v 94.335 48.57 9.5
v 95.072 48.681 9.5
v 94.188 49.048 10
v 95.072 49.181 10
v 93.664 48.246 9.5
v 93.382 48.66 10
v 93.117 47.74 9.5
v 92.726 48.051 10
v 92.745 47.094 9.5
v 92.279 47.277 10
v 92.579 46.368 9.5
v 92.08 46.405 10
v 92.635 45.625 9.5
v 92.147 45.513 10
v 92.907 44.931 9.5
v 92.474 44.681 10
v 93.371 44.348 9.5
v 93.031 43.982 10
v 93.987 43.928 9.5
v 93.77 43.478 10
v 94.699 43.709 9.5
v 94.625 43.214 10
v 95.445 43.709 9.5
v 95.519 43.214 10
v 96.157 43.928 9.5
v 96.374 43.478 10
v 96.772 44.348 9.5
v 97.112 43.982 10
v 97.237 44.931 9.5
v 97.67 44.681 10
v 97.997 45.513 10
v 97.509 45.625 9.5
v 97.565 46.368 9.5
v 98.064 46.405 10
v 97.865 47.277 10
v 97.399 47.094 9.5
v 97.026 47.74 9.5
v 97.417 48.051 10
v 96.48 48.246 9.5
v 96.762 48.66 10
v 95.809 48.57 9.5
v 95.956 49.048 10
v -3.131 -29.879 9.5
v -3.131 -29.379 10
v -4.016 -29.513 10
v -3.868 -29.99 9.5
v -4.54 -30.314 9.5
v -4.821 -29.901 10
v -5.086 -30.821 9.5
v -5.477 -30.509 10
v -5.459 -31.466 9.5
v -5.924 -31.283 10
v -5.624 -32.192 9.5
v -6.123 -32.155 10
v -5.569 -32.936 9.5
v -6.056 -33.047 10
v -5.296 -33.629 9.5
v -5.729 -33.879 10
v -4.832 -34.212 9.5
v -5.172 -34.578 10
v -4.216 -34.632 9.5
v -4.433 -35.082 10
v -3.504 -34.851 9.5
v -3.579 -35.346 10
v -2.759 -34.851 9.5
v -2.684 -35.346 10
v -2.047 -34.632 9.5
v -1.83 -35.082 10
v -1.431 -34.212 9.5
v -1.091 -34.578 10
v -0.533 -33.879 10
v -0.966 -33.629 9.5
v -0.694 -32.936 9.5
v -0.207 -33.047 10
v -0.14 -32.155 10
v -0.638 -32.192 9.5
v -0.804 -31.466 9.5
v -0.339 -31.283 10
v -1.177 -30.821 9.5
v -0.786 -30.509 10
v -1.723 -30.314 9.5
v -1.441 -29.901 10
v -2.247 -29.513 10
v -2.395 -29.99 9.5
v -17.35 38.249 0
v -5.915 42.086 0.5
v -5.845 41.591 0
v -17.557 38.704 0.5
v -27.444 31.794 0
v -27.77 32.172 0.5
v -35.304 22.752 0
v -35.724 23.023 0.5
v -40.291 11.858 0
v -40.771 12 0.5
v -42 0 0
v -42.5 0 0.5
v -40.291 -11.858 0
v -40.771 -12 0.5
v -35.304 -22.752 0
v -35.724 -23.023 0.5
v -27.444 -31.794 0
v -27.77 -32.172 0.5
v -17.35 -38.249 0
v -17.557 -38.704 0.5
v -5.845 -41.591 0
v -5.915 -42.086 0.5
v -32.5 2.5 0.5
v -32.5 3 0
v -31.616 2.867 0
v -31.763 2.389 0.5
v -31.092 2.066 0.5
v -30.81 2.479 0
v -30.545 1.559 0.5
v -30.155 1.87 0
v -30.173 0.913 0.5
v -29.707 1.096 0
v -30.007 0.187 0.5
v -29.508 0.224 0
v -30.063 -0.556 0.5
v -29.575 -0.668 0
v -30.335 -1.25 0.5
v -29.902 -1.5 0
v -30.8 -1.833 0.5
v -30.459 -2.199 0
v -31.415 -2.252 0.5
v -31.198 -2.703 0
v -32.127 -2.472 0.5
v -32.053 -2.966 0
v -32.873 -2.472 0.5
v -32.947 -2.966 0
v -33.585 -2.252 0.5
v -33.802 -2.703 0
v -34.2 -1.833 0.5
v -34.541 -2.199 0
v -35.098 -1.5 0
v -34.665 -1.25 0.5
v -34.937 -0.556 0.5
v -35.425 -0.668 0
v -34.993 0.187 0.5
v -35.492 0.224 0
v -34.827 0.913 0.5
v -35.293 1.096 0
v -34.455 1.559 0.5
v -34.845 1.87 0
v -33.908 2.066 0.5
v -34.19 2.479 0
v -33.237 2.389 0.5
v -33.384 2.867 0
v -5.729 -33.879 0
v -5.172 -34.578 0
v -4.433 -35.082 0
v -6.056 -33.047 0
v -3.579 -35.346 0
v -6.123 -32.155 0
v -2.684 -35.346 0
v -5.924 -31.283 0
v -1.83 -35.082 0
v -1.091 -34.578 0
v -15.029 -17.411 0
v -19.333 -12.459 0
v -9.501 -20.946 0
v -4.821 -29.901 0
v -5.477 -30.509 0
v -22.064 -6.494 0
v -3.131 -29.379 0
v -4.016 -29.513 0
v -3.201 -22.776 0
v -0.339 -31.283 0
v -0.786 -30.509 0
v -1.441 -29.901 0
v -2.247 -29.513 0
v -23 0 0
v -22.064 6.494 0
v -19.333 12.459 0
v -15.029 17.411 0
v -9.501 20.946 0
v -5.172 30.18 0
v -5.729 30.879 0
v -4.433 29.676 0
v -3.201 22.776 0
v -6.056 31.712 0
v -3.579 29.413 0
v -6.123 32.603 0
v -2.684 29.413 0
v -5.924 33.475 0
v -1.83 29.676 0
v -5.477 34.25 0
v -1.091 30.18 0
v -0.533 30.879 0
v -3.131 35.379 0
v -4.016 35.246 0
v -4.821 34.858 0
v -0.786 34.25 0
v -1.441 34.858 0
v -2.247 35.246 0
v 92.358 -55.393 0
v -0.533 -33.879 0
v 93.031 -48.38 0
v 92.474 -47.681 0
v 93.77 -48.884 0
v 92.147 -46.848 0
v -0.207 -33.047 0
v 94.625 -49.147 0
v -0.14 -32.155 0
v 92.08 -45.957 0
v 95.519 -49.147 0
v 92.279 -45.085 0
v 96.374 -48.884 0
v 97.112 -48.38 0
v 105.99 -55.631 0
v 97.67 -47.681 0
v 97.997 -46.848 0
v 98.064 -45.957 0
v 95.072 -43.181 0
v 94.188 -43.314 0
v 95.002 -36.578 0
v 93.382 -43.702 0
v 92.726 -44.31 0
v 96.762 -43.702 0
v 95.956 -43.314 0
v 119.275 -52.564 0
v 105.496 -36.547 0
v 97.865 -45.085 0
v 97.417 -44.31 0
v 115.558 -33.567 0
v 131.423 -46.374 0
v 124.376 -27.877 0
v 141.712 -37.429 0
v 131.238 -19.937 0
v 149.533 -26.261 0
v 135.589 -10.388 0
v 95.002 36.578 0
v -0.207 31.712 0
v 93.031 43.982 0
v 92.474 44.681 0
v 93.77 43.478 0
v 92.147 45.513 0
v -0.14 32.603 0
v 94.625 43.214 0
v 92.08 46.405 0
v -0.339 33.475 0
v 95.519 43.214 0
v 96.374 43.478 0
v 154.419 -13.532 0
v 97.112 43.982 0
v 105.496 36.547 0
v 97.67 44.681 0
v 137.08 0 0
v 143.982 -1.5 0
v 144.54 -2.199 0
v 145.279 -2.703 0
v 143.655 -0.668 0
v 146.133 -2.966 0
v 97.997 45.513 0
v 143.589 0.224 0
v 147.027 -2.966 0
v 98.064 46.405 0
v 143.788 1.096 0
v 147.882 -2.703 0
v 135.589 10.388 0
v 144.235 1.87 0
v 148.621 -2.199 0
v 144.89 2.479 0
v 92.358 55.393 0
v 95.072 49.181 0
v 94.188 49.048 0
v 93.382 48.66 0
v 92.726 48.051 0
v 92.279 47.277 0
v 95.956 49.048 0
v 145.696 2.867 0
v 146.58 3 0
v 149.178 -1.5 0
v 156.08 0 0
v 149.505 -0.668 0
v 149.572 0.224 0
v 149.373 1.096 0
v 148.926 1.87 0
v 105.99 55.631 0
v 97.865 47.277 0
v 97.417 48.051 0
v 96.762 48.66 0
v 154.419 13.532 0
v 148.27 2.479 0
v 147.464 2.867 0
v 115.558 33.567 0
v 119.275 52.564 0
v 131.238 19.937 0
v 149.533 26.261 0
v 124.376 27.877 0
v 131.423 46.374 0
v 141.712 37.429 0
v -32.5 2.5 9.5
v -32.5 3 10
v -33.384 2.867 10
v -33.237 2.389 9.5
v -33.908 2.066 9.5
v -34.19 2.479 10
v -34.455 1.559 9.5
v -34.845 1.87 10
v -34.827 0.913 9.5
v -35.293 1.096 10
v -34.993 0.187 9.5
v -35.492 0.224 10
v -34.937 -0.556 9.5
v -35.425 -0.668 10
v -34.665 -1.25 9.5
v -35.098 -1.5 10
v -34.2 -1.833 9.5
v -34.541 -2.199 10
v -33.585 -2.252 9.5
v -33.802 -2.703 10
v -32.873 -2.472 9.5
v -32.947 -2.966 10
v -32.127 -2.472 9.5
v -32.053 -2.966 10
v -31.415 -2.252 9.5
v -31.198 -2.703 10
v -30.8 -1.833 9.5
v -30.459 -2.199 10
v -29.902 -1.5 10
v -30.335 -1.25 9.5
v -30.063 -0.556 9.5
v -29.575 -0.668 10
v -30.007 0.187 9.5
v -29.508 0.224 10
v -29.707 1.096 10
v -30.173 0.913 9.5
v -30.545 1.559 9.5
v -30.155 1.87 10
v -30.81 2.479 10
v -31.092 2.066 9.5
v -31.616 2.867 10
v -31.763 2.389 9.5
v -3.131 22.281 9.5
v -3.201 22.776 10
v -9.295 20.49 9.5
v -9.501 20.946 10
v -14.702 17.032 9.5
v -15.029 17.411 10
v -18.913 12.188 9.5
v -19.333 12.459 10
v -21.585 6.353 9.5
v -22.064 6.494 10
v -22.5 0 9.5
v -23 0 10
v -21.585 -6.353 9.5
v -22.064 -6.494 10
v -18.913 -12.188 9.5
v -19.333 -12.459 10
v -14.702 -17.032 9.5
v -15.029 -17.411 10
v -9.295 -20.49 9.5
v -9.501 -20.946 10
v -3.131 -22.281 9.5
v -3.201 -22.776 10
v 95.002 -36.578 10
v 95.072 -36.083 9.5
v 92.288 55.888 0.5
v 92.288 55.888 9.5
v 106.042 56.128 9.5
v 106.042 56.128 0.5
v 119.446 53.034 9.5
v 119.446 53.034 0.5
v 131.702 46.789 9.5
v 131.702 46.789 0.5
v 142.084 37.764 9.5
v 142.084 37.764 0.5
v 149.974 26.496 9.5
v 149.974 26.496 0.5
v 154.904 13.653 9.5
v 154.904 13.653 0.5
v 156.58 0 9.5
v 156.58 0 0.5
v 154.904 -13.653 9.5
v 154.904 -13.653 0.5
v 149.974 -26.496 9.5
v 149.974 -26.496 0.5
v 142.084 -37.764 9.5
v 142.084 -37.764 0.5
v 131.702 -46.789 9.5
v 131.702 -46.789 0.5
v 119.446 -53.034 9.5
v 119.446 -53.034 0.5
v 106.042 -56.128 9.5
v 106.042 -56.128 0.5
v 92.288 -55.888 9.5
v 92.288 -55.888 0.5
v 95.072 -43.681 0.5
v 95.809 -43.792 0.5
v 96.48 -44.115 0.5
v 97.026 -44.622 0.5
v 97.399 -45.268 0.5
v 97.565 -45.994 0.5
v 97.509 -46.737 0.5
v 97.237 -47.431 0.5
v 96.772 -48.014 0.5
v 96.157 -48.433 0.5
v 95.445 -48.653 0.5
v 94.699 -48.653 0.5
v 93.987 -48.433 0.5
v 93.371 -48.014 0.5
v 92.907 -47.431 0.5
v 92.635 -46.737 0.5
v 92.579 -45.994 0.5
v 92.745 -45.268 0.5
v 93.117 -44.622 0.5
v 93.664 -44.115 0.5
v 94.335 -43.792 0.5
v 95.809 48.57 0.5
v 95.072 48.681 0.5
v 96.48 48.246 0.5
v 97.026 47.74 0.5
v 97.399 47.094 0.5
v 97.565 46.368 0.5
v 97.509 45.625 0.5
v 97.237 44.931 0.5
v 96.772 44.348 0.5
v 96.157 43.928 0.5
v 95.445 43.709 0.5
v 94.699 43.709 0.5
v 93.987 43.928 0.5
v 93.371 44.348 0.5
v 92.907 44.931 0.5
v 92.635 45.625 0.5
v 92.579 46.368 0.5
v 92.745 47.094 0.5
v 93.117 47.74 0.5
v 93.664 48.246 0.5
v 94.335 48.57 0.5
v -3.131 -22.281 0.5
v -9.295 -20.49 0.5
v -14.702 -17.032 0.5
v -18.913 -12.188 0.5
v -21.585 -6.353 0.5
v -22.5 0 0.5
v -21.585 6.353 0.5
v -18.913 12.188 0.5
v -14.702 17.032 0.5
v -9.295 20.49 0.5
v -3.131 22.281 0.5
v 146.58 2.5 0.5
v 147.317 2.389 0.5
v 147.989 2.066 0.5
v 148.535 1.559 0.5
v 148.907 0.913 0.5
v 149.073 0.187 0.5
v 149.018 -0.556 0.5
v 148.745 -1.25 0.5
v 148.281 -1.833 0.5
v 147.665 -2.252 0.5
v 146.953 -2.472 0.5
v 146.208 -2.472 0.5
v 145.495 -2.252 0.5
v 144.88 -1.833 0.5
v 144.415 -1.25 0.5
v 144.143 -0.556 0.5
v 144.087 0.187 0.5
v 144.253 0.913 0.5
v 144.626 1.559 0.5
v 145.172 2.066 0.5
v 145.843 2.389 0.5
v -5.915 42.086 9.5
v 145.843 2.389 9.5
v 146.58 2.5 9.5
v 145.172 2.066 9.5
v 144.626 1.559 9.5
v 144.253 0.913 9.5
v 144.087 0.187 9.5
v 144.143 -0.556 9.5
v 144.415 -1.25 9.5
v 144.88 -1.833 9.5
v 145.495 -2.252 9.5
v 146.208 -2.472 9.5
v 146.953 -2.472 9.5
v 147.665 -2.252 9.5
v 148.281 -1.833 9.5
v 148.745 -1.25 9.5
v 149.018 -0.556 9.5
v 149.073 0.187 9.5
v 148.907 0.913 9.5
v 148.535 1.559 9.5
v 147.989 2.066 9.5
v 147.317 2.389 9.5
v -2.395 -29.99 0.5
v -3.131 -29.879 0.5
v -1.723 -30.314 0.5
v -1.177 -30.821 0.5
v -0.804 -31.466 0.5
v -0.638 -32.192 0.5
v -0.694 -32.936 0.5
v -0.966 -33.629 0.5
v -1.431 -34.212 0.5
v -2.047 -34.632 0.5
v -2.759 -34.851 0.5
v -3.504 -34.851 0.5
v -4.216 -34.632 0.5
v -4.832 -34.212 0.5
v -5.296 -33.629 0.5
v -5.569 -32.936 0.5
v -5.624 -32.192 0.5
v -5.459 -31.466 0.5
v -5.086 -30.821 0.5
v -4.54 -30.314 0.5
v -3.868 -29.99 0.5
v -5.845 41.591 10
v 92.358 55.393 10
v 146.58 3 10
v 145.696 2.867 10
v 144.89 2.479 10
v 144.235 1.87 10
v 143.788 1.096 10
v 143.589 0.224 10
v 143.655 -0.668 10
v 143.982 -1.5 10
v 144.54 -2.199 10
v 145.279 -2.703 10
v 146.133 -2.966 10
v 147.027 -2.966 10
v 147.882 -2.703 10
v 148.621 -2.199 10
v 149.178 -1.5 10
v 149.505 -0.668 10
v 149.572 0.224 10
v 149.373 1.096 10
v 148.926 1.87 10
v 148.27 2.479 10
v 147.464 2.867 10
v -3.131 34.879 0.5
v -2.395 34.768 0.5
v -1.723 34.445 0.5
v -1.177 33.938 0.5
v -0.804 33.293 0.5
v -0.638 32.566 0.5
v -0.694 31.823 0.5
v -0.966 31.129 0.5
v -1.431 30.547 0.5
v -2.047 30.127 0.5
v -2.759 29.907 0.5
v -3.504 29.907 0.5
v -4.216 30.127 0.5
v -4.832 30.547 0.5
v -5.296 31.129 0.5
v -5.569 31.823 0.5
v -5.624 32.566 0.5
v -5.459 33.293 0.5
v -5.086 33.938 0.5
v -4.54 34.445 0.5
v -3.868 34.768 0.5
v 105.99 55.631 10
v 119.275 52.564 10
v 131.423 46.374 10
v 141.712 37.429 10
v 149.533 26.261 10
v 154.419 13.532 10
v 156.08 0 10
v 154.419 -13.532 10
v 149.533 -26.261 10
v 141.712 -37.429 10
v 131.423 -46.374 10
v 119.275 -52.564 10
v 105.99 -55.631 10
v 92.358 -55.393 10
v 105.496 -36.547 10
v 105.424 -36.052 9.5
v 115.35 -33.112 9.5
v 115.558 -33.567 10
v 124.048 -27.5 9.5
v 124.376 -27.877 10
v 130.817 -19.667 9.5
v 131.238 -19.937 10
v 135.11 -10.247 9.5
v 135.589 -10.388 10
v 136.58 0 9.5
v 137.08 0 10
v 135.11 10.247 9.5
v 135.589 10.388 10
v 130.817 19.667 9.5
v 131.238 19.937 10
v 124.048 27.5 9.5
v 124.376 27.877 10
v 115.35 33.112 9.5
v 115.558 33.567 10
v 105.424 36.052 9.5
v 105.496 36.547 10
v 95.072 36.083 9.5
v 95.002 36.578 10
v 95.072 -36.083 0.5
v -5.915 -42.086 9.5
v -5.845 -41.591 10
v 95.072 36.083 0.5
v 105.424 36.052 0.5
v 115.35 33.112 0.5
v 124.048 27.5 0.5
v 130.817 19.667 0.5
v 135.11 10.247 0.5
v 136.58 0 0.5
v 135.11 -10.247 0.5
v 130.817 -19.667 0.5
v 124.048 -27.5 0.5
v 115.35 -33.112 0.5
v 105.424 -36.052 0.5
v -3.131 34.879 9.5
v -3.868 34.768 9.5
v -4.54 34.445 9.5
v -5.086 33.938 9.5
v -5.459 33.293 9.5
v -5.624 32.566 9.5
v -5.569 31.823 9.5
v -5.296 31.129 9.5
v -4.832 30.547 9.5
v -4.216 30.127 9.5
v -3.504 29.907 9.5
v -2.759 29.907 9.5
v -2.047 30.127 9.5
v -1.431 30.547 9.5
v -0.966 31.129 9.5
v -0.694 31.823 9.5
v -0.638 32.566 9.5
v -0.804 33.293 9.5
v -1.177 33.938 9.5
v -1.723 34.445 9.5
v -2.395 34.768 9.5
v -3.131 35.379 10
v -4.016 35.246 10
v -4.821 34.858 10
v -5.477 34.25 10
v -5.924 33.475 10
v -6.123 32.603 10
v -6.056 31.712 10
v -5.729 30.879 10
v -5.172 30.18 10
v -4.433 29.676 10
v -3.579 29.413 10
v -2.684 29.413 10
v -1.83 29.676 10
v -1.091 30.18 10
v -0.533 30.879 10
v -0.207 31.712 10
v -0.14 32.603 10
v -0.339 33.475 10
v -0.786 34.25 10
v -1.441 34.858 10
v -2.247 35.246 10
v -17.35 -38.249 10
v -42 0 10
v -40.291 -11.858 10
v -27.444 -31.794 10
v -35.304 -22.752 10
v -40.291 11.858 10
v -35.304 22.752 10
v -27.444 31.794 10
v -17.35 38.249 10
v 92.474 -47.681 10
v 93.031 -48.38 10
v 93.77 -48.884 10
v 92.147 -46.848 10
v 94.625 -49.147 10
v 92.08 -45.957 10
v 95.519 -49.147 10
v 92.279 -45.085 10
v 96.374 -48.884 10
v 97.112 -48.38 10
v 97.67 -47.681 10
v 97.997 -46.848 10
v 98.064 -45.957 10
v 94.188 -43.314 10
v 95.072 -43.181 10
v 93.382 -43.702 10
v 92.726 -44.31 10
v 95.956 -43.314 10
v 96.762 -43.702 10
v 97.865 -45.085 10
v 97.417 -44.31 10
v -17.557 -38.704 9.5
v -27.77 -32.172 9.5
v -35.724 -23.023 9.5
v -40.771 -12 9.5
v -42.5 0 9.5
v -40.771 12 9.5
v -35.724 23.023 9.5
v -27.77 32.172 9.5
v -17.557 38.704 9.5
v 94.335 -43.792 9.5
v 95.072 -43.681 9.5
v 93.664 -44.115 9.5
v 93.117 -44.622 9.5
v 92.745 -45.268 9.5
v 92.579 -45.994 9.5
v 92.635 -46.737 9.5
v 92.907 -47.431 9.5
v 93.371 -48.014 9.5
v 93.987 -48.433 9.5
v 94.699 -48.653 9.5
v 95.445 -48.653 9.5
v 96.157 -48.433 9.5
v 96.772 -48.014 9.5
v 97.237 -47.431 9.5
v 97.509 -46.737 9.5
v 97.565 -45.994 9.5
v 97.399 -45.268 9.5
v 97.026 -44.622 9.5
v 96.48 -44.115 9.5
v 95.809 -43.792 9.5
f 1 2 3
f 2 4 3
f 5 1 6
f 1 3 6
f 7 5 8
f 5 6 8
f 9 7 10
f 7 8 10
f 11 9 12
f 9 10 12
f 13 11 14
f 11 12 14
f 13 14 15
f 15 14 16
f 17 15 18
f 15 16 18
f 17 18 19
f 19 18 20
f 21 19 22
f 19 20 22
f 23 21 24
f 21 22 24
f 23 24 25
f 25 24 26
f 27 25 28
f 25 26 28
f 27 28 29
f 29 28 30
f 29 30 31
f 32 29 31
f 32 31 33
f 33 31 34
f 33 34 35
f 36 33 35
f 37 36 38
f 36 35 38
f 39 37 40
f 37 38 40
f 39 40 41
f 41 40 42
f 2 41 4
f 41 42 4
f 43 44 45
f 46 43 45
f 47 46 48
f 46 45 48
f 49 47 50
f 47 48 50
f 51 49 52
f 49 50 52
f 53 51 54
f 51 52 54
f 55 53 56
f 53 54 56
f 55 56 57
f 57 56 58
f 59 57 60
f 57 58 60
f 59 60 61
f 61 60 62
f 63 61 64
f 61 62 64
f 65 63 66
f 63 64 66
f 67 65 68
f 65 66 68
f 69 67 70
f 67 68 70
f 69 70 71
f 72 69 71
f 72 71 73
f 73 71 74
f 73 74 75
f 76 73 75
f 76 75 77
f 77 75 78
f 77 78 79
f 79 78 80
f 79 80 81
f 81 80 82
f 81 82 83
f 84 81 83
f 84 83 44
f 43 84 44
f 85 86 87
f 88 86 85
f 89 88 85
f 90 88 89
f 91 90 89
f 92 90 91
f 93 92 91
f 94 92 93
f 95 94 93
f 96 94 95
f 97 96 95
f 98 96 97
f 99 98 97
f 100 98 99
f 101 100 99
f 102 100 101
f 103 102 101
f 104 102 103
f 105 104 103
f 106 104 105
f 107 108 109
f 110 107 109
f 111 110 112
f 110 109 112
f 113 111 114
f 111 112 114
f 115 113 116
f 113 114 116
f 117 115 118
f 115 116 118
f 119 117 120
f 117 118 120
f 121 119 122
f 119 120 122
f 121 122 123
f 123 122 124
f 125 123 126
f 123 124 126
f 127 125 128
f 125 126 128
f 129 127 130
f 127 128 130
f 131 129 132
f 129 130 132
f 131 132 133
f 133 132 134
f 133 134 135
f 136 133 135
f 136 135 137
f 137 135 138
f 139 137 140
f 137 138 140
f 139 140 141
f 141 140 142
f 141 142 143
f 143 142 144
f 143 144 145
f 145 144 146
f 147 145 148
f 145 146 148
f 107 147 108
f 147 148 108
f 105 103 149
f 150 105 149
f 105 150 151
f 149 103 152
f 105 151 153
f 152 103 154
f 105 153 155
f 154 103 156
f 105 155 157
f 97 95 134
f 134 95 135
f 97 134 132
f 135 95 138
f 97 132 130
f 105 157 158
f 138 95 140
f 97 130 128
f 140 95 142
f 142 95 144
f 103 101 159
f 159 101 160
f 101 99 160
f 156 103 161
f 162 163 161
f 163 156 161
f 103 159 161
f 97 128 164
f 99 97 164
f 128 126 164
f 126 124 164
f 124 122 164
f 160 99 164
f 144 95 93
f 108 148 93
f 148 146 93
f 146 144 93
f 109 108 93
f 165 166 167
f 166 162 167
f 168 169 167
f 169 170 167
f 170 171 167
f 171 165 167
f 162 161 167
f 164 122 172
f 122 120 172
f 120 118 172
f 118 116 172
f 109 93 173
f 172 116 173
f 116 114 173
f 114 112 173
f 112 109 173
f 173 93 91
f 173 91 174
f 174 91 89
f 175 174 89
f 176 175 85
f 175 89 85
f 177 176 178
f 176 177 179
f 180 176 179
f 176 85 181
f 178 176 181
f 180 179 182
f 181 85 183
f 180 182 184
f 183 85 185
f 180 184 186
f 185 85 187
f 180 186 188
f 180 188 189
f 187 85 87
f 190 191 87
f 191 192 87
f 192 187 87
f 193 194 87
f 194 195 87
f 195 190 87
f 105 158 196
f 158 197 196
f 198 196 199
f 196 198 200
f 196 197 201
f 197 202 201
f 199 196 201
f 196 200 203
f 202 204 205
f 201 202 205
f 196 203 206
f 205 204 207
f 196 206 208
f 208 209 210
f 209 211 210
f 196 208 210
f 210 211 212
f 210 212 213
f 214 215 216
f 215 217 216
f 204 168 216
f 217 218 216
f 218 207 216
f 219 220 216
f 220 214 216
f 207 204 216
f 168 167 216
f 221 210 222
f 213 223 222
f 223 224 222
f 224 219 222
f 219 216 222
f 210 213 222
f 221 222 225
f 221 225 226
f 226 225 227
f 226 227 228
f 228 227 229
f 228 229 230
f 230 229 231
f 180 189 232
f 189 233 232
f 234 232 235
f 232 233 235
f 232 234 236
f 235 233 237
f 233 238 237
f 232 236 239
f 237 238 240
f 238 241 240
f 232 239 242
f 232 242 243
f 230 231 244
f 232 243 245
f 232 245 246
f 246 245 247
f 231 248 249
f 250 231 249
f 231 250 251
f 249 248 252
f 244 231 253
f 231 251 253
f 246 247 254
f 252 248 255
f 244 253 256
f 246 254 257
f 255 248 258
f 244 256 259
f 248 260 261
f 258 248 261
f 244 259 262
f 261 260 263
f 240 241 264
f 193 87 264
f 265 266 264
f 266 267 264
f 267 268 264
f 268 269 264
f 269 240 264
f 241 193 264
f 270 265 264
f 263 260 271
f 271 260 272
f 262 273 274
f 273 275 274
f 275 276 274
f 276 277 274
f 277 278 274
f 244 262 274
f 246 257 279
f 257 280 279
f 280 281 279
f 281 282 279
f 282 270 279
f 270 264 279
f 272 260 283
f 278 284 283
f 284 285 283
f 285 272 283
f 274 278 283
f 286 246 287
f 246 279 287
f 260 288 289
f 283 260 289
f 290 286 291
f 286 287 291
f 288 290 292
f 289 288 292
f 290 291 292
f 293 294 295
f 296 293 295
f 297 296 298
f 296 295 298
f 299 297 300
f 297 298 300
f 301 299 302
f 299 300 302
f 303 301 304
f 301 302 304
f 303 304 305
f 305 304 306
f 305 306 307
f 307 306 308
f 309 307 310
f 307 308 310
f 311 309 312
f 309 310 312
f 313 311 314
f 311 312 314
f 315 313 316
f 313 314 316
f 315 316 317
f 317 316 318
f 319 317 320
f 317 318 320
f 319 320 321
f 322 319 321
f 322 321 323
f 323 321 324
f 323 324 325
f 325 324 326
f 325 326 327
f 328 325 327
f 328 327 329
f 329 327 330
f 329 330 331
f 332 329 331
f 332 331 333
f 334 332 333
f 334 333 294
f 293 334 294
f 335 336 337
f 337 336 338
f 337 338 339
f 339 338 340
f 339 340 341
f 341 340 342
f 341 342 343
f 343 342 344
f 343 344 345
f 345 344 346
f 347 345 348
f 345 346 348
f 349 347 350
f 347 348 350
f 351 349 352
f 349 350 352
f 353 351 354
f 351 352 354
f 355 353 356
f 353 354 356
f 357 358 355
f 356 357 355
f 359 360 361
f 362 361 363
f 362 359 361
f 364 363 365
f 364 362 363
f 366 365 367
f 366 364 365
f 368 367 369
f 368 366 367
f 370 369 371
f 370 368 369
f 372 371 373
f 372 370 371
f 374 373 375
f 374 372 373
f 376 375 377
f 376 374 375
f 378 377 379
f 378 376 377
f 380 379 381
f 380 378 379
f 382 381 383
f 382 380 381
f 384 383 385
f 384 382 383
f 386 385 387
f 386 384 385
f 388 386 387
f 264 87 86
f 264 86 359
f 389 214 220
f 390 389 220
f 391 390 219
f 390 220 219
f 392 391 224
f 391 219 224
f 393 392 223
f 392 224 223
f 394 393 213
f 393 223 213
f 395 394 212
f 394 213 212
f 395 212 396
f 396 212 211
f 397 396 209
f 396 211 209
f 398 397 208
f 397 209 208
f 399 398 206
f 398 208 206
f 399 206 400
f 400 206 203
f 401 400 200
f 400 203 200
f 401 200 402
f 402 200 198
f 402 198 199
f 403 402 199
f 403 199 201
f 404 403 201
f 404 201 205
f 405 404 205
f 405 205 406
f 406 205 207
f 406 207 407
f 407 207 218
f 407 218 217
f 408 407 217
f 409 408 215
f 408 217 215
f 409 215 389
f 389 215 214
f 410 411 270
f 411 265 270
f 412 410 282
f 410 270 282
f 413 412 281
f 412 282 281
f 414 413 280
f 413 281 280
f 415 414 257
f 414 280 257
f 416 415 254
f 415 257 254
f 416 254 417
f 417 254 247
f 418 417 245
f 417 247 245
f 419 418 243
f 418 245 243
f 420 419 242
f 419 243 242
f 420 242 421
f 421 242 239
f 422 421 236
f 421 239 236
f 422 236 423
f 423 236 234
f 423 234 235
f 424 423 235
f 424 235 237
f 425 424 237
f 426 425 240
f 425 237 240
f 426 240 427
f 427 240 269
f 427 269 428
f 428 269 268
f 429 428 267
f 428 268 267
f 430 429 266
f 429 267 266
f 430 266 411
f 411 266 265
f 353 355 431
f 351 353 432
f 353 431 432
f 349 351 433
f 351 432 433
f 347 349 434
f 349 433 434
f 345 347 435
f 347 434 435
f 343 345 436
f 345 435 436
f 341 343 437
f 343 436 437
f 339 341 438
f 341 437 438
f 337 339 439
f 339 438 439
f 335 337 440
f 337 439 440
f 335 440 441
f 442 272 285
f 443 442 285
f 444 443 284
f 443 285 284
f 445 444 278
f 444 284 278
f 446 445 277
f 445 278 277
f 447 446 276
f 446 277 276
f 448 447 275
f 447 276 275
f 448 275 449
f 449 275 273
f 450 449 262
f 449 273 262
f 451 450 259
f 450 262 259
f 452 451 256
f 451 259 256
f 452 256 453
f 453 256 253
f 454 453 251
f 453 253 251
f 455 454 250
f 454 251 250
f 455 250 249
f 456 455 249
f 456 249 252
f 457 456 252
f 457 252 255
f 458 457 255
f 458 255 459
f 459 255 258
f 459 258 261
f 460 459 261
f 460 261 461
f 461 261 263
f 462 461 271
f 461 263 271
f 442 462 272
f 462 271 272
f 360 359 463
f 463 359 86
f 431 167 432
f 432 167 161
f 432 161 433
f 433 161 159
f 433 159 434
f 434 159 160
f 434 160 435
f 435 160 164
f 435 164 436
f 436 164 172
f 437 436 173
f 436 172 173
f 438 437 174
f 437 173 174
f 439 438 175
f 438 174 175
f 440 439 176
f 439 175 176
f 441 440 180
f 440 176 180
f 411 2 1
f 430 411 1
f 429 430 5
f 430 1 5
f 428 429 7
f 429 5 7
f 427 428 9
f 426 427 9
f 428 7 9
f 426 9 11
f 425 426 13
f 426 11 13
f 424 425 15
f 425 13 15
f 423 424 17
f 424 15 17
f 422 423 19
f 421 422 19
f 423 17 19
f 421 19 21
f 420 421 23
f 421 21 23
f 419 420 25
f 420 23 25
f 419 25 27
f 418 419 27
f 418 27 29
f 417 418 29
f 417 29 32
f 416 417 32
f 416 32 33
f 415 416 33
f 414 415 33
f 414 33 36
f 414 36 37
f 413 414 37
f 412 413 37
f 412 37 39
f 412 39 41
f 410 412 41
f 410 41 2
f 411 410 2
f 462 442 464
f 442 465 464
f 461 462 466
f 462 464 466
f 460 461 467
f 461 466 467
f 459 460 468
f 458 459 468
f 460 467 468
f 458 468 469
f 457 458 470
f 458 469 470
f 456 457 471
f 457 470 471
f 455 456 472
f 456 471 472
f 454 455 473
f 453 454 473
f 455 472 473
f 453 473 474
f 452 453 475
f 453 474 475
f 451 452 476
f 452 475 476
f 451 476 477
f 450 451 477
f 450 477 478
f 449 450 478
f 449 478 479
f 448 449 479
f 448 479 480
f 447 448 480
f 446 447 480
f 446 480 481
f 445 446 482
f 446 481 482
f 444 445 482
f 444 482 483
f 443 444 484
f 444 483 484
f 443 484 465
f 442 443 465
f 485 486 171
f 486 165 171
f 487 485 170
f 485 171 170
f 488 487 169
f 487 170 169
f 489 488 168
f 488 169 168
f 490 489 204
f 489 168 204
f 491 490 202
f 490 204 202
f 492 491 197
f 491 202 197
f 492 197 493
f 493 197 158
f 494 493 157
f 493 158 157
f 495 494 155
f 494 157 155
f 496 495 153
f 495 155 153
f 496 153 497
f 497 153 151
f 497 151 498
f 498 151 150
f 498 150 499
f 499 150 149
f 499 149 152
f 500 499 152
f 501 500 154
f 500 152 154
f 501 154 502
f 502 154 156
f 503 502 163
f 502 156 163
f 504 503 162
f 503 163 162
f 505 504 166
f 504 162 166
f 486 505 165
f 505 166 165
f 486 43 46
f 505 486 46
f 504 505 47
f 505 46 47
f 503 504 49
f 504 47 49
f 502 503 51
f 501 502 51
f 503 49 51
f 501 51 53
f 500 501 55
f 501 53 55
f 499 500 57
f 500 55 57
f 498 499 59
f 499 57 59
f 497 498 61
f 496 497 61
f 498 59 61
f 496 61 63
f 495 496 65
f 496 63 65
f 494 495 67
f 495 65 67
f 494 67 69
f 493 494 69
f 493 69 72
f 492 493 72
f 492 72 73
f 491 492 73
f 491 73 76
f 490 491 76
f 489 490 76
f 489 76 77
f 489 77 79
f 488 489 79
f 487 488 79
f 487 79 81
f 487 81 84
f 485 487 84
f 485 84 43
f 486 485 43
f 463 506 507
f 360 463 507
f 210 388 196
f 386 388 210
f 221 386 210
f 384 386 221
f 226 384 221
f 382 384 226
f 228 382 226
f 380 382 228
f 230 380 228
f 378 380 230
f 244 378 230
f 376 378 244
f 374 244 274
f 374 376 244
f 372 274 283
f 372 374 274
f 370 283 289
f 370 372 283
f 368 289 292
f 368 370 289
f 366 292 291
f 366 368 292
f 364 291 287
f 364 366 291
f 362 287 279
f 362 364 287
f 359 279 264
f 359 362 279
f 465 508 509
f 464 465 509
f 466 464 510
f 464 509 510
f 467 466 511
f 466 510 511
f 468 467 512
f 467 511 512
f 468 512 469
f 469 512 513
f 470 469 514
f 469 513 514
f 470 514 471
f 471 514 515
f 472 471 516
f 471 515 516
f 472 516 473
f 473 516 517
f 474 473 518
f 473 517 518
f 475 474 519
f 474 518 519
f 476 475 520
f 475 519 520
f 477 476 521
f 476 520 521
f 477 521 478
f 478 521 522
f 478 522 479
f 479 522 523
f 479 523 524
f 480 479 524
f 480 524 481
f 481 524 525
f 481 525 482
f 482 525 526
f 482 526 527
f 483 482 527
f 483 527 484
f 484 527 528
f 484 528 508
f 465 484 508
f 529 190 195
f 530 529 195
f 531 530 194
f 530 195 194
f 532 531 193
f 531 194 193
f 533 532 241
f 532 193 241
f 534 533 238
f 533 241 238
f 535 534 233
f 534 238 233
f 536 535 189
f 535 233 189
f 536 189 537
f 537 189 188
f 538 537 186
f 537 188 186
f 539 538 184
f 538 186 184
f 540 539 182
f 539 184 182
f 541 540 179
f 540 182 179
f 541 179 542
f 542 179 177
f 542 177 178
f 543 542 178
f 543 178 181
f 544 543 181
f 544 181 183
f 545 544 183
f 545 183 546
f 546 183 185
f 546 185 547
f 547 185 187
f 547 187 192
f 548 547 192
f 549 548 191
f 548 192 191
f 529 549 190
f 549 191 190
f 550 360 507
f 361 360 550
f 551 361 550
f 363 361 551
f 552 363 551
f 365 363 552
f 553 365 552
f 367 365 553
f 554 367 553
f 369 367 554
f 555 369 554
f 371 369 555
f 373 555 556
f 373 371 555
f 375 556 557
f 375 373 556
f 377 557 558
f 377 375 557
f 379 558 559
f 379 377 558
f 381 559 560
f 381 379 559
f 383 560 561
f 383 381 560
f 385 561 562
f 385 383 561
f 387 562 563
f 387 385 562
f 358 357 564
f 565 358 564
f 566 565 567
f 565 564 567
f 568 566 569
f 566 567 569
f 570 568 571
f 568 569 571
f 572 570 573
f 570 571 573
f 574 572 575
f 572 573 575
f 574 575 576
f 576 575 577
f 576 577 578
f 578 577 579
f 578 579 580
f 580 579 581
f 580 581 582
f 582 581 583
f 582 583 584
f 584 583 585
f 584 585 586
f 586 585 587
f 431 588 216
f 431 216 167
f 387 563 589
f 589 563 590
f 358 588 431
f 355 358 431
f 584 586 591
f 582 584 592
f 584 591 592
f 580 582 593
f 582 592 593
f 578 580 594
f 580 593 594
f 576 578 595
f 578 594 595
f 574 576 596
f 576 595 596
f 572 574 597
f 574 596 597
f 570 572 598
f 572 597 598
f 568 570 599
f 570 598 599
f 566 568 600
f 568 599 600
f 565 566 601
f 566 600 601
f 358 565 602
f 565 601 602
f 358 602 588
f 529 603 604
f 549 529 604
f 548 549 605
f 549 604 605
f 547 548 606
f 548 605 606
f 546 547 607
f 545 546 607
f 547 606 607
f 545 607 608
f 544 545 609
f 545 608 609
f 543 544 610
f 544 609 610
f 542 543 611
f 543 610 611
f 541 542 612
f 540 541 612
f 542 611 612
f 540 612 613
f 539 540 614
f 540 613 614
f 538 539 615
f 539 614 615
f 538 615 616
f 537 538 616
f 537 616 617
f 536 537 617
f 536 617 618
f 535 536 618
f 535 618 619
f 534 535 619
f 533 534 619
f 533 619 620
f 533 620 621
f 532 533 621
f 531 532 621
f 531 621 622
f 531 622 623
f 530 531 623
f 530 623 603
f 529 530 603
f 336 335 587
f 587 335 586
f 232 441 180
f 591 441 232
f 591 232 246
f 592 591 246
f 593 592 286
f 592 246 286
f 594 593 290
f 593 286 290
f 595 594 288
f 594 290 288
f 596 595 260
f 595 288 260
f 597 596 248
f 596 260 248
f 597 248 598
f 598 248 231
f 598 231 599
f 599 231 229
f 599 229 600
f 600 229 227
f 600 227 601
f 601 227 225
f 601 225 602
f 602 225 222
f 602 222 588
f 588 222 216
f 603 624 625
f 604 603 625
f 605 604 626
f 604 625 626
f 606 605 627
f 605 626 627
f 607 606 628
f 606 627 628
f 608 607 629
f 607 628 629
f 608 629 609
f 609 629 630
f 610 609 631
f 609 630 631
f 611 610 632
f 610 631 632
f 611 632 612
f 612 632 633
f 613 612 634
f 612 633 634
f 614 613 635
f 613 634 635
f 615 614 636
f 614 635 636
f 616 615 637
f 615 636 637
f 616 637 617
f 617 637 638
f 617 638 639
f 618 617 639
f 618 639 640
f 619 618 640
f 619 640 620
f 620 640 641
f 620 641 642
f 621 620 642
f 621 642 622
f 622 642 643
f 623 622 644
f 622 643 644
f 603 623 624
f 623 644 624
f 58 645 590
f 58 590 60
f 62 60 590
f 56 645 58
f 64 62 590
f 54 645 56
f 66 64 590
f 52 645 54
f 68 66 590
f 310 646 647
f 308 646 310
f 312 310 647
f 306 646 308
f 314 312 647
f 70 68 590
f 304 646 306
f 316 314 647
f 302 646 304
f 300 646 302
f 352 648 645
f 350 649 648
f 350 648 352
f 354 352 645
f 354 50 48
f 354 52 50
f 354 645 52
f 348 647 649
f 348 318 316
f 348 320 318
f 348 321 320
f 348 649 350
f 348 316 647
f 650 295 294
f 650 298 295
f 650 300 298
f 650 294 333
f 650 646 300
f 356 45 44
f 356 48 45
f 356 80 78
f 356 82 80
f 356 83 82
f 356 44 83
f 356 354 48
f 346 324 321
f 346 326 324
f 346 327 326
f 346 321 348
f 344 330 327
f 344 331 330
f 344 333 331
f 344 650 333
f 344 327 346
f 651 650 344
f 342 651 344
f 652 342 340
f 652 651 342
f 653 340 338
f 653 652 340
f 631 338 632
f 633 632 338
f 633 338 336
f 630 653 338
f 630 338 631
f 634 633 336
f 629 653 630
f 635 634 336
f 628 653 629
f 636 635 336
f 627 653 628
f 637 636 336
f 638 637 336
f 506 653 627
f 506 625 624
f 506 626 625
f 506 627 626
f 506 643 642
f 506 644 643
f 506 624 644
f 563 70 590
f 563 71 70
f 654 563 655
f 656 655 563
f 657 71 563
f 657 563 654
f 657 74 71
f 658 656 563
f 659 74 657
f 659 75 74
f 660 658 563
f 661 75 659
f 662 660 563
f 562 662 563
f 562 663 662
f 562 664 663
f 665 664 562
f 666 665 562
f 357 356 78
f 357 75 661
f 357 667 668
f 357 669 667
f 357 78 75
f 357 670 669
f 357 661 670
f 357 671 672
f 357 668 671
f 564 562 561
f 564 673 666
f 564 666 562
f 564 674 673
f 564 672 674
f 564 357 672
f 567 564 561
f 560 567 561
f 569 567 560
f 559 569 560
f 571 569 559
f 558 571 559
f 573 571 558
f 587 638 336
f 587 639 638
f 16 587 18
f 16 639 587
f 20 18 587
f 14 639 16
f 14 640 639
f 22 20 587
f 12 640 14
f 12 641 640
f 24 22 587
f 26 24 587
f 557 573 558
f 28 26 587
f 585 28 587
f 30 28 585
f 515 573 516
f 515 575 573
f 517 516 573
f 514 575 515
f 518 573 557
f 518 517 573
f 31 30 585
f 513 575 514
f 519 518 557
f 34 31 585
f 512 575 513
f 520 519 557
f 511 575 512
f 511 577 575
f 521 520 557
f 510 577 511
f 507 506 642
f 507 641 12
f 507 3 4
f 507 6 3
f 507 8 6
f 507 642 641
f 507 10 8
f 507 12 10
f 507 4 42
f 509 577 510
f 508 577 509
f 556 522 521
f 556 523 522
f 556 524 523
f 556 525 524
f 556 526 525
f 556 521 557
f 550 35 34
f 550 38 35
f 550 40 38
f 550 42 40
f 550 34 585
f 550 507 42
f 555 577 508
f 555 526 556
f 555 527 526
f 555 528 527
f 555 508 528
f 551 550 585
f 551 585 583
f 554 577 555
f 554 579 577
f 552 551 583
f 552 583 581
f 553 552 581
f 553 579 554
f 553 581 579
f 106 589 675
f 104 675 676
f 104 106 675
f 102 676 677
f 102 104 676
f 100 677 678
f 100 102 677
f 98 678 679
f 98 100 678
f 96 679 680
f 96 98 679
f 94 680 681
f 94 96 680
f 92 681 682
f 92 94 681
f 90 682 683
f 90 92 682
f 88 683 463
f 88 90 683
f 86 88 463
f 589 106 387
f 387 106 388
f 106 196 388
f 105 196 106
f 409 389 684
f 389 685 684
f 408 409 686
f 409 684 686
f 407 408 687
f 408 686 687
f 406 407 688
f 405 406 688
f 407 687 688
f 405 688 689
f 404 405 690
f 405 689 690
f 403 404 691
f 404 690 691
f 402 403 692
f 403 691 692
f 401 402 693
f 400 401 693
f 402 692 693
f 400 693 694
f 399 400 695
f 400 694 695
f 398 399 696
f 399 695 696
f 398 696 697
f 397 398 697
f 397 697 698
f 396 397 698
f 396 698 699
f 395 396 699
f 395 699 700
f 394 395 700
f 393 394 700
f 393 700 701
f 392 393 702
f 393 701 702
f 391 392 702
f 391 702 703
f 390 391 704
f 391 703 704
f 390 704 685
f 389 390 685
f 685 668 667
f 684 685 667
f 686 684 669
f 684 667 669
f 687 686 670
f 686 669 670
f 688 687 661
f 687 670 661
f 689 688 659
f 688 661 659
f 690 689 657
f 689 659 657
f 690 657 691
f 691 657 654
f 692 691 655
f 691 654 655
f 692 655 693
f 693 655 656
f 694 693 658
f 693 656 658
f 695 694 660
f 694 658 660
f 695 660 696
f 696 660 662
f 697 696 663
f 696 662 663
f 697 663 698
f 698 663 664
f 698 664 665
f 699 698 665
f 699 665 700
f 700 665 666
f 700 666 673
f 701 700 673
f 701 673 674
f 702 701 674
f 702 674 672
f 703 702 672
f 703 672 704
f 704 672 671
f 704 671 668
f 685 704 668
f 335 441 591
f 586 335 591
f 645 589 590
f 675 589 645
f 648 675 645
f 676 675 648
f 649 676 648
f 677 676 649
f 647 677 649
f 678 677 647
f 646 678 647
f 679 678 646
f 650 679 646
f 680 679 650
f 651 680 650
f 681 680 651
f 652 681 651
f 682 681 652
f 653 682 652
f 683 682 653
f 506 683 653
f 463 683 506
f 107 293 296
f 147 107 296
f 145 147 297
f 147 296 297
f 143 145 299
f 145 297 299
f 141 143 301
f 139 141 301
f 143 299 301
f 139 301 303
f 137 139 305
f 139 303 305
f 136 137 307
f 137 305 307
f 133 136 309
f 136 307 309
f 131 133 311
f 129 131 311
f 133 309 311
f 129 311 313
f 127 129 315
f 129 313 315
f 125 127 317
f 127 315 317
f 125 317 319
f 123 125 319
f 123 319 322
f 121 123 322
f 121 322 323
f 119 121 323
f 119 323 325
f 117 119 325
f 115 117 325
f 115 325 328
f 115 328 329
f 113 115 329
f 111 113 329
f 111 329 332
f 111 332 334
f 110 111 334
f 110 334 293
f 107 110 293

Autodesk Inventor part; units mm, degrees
ref_plane "YZ Plane" through (0, 0, 0) normal (1, 0, 0) x (0, 1, 0)
ref_plane "XZ Plane" through (0, 0, 0) normal (0, 1, 0) x (-1, 0, 0)
ref_plane "XY Plane" through (0, 0, 0) normal (0, 0, 1) x (1, 0, 0)
sketch "Sketch1" plane through (0, 0, 0) normal (0, 0, 1) x (1, 0, 0)
  arc A0 (-5.9149, 42.0864) -> (-5.9149, -42.0864) centre (0, 0) ccw
  arc A1 (92.2885, -55.888) -> (92.2885, 55.888) centre (100.143, 0) ccw
  line L0 (-42.5, 0) -> (156.5802, 0)
  line L1 (92.2885, 55.888) -> (-5.9149, 42.0864)
  line L2 (-5.9149, -42.0864) -> (92.2885, -55.888)
  line L3 (-3.1314, 22.281) -> (95.0719, 36.0826)
  arc A2 (95.0719, -36.0826) -> (95.0719, 36.0826) centre (100.143, 0) ccw
  line L4 (95.0719, -36.0826) -> (-3.1314, -22.281)
  arc A3 (-3.1314, 22.281) -> (-3.1314, -22.281) centre (0, 0) ccw
  point P0 (146.5802, 0)
  point P1 (95.0719, 46.1809)
  point P2 (95.0719, -46.1809)
  point P3 (-32.5, 0)
  point P4 (-3.1314, 32.3793)
  point P5 (-3.1314, -32.3793)
  dimension "d0" = 85
  dimension "d1" = 100.143
  dimension "d2" = 8
  dimension "d3" = 20
  dimension "d4" = 10
  dimension "d5" = 10
  dimension "d6" = 10
  dimension "d7" = 10
  dimension "d8" = 10
  dimension "d9" = 10
extrude "Extrusion1" add sketch "Sketch1" along normal blind 10 contours L1 A1 L0 A2 L3 A3 A0 | L0 A3 L4 A2 A1 L2 A0
hole "Hole1" at (-32.5, 0, 0) at (-3.1314, 32.3793, 0) at (95.0719, 46.1809, 0) at (146.5802, 0, 0) at (95.0719, -46.1809, 0) at (-3.1314, -32.3793, 0) direction (0, 0, 1) diameter 5 end through all
chamfer "Chamfer1" distance 0.5 angle 45 28 edges at (136.5802, 0, 10) (45.9703, -29.1818, 10) (-22.5, 0, 10) (45.9703, 29.1818, 10) (136.5802, 0, 0) (45.9703, -29.1818, 0) (-22.5, 0, 0) (45.9703, 29.1818, 0) (-3.1314, -34.8793, 0) (-32.5, -2.5, 0) (95.0719, -48.6809, 0) (146.5802, -2.5, 0) (-3.1314, 29.8793, 0) (95.0719, 43.6809, 0) (-3.1314, -34.8793, 10) (-32.5, -2.5, 10) (95.0719, -48.6809, 10) (146.5802, -2.5, 10) (-3.1314, 29.8793, 10) (95.0719, 43.6809, 10) (156.5802, 0, 0) (43.1868, 48.9872, 0) (-42.5, 0, 0) (43.1868, -48.9872, 0) (156.5802, 0, 10) (43.1868, 48.9872, 10) (-42.5, 0, 10) (43.1868, -48.9872, 10)
equation "\"d4\" = 0.5 * d3"
equation "\"d5\" = 0.5 * d3"
equation "\"d6\" = 0.5 * d3"
equation "\"d7\" = 0.5 * d3"
equation "\"d8\" = d6"
equation "\"d9\" = d7"
properties part number "spacerBase" material "Aluminum 6061"
